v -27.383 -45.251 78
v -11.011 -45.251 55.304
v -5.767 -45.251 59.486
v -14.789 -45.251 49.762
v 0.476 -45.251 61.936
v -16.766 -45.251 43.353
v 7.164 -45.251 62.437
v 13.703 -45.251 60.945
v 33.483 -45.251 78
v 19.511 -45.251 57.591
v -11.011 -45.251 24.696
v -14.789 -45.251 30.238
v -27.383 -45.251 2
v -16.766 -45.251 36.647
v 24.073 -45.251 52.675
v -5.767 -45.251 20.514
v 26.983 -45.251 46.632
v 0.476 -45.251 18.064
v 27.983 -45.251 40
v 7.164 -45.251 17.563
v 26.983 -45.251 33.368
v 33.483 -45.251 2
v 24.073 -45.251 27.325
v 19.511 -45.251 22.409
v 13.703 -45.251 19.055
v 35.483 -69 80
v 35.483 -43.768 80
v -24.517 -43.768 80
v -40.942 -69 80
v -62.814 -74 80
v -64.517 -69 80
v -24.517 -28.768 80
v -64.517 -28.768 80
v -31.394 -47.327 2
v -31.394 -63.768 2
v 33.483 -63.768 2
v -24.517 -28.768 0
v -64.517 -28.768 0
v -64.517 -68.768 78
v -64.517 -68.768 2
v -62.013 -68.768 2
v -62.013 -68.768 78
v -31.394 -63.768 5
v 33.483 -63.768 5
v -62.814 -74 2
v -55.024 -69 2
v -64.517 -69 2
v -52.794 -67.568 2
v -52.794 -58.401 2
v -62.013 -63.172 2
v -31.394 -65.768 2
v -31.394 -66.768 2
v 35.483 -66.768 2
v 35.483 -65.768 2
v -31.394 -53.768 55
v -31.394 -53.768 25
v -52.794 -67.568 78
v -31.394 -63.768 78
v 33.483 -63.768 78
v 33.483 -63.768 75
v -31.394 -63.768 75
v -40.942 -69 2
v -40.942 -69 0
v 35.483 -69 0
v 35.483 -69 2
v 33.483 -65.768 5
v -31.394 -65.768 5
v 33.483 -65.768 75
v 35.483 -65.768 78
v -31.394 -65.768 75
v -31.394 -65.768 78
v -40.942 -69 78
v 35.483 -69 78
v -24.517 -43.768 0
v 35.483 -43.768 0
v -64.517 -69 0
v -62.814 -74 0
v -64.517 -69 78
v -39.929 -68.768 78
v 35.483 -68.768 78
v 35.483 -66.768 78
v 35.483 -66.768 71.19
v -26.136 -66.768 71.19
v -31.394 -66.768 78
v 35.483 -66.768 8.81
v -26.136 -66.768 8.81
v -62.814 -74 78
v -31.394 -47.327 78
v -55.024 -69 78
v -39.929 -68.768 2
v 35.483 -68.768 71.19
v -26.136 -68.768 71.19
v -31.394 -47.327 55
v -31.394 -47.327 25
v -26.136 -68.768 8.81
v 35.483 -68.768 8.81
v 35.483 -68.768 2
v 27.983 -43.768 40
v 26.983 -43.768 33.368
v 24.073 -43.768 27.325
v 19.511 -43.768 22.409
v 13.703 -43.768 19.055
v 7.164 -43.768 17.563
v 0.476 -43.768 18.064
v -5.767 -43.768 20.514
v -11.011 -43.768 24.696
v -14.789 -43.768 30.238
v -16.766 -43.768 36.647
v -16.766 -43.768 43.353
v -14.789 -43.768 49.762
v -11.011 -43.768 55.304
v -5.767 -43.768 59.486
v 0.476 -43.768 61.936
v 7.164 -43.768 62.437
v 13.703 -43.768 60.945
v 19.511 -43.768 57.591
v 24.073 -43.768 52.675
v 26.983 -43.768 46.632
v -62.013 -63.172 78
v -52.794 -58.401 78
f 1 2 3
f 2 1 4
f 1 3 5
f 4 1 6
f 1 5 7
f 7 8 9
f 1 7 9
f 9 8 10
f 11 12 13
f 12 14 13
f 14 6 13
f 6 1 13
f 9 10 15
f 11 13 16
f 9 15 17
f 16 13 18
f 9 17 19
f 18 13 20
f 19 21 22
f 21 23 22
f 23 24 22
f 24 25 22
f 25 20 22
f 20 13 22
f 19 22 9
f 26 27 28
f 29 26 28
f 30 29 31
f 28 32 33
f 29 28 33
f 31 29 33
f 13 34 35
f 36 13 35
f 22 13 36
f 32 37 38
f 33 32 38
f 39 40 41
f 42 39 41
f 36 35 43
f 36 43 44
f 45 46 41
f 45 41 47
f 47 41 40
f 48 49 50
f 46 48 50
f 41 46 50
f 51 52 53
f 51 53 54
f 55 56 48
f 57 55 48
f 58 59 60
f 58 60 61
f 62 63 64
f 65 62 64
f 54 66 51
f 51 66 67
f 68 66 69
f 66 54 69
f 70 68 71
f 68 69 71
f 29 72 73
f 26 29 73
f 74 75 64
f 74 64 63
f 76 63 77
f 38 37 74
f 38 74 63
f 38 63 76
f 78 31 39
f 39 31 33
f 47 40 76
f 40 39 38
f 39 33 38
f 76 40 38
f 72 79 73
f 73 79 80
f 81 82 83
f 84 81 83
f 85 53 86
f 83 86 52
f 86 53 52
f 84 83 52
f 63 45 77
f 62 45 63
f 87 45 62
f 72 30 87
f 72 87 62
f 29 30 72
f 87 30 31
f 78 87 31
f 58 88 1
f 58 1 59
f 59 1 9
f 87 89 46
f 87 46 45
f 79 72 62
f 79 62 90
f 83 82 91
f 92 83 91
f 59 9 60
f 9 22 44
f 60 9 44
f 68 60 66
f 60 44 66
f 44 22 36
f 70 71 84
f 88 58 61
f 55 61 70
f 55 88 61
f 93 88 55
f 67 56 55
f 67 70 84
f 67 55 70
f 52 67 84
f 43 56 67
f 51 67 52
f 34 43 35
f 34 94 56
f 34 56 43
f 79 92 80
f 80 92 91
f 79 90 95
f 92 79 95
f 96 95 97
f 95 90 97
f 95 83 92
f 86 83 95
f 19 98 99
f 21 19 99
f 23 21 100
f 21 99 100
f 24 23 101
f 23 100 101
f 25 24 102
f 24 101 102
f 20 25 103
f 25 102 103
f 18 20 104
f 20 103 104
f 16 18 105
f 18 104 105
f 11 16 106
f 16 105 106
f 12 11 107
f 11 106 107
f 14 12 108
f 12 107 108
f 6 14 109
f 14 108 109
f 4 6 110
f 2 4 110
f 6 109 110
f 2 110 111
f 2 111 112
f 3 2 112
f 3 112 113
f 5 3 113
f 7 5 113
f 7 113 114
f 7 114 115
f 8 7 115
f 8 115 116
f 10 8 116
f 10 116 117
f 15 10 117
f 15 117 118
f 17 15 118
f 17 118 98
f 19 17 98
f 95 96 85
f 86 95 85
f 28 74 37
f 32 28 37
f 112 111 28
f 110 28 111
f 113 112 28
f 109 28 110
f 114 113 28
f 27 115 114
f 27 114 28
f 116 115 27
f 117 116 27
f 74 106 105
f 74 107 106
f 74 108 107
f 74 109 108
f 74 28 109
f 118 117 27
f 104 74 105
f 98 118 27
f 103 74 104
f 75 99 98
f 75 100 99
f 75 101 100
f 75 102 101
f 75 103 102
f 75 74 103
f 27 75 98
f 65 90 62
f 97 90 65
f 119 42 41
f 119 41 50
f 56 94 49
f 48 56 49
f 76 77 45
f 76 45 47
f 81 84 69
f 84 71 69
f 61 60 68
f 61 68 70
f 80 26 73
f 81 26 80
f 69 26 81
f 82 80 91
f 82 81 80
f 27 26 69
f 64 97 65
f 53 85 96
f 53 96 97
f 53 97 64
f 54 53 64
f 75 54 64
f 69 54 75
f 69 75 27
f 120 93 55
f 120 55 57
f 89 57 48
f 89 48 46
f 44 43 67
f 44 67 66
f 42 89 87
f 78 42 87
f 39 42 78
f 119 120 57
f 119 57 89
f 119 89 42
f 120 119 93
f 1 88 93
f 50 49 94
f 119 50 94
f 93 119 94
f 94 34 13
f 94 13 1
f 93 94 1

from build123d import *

# Parameters (mm, degrees)
BOSS_EXTRUDE1_DEPTH      = 80
BOSS_EXTRUDE2_DEPTH      = 25
SKETCH5_W                = 100
SKETCH5_H                = 2
BOSS_EXTRUDE3_DEPTH      = 1
BOSS_EXTRUDE3_DEPTH_BACK = 69
CUT_EXTRUDE1_DEPTH       = 54
CUT_EXTRUDE1_DEPTH_BACK  = 128
BOSS_EXTRUDE4_DEPTH      = 80
BOSS_EXTRUDE5_DEPTH      = 2
BOSS_EXTRUDE6_DEPTH      = 2
CUT_EXTRUDE2_DEPTH       = 10
SKETCH12_W               = 66.626507626
SKETCH12_H               = 2
BOSS_EXTRUDE7_DEPTH      = 3
SKETCH13_W               = 64.876762197
SKETCH13_H               = 2
BOSS_EXTRUDE8_DEPTH      = 3
CUT_EXTRUDE3_DEPTH       = 61.618605692


with BuildPart() as part:
    # Sketch1 → Boss-Extrude1 (new body)
    with BuildSketch(Plane.XY):
        Polygon((33.482657766, -45.251477229), (33.482657766, -66.768484939), (-31.394104431, -66.768484939), (-31.394104431, -53.768484939), (-54.654934222, -68.768484939), (35.482657766, -68.768484939), (35.482657766, -43.768484939), (-24.517342234, -43.768484939), (-24.517342234, -28.768484939), (-64.517342234, -28.768484939), (-64.517342234, -68.768484939), (-62.012951809, -68.768484939), (-62.012951809, -63.171810384), (-27.383124188, -45.251477229), align=None)
    extrude(amount=BOSS_EXTRUDE1_DEPTH)

    # Sketch4 → Boss-Extrude2 (add)
    with BuildSketch(Plane(origin=(0, -43.768484939, 0), x_dir=(1, 0, 0), z_dir=(0, 1, 0))):
        Polygon((-54.654934222, -80), (-31.394104431, -80), (-31.394104431, -55), align=None)
        Polygon((-54.654934222, 0), (-31.394104431, 0), (-31.394104431, -25), align=None)
    extrude(amount=-BOSS_EXTRUDE2_DEPTH)

    # Sketch5 → Boss-Extrude3 (add, two sides)
    with BuildSketch(Plane(origin=(0, 0, 0), x_dir=(1, 0, 0), z_dir=(0, 1, 0))) as boss_extrude3_sk:
        with Locations((-14.517342234, -79)):
            Rectangle(SKETCH5_W, SKETCH5_H)
        with Locations((-14.517342234, -1)):
            Rectangle(SKETCH5_W, SKETCH5_H)
    extrude(amount=BOSS_EXTRUDE3_DEPTH)
    extrude(boss_extrude3_sk.sketch, amount=-BOSS_EXTRUDE3_DEPTH_BACK)

    # Sketch6 → Cut-Extrude1 (cut, two sides)
    with BuildSketch(Plane(origin=(0, 0, 0), x_dir=(-1, 0, 0), z_dir=(0, 0, -1))) as cut_extrude1_sk:
        Polygon((64.517342234, -28.768484939), (24.517342234, -28.768484939), (24.517342234, -43.768484939), (-35.482657766, -43.768484939), (-64.959998335, 15.691238157), (80.820060582, 20.703322698), align=None)
    extrude(amount=CUT_EXTRUDE1_DEPTH, mode=Mode.SUBTRACT)
    extrude(cut_extrude1_sk.sketch, amount=-CUT_EXTRUDE1_DEPTH_BACK, mode=Mode.SUBTRACT)

    # Sketch7 → Boss-Extrude4 (add)
    with BuildSketch(Plane.XY.offset(80)):
        Polygon((-40.942007341, -69), (-55.024396115, -69), (-62.814493255, -74), align=None)
        Polygon((-47.280486214, -68.008659762), (-52.794067838, -67.568484939), (-55.024396115, -69), (-40.942007341, -69), (-39.368534116, -68.640307638), align=None)
    extrude(amount=-BOSS_EXTRUDE4_DEPTH)

    # Sketch9 → Boss-Extrude5 (add)
    with BuildSketch(Plane.XY.offset(80)):
        Polygon((-64.517342234, -69), (-55.024396115, -69), (-62.814493255, -74), align=None)
    extrude(amount=-BOSS_EXTRUDE5_DEPTH)

    # Sketch10 → Boss-Extrude6 (add)
    with BuildSketch(Plane(origin=(0, 0, 0), x_dir=(-1, 0, 0), z_dir=(0, 0, -1))):
        Polygon((64.517342234, -69), (55.024396115, -69), (62.814493255, -74), align=None)
    extrude(amount=-BOSS_EXTRUDE6_DEPTH)

    # Sketch11 → Cut-Extrude2 (cut)
    with BuildSketch(Plane(origin=(0, -43.768484939, 0), x_dir=(1, 0, 0), z_dir=(0, 1, 0))):
        with BuildLine():
            ThreePointArc((-17.017342234, -40), (5.482657766, -62.5), (27.982657766, -40))
            Line((27.982657766, -40), (-17.017342234, -40))
        make_face()
        with BuildLine():
            Line((-17.017342234, -40), (27.982657766, -40))
            ThreePointArc((27.982657766, -40), (5.482657766, -17.5), (-17.017342234, -40))
        make_face()
    extrude(amount=-CUT_EXTRUDE2_DEPTH, mode=Mode.SUBTRACT)

    # Sketch12 → Boss-Extrude7 (add)
    with BuildSketch(Plane(origin=(0, 0, 78), x_dir=(-1, 0, 0), z_dir=(0, 0, -1))):
        with Locations((-1.919149382, -64.768484939)):
            Rectangle(SKETCH12_W, SKETCH12_H)
    extrude(amount=BOSS_EXTRUDE7_DEPTH)

    # Sketch13 → Boss-Extrude8 (add)
    with BuildSketch(Plane.XY.offset(2)):
        with Locations((1.044276668, -64.768484939)):
            Rectangle(SKETCH13_W, SKETCH13_H)
    extrude(amount=BOSS_EXTRUDE8_DEPTH)

    # Sketch14 → Cut-Extrude3 (cut)
    with BuildSketch(Plane(origin=(35.482657766, 0, 0), x_dir=(0, 0, -1), z_dir=(1, 0, 0))):
        Polygon((-2, -65.768484939), (-78, -65.768484939), (-78, -66.768484939), (-71.1896289, -66.768484939), (-71.1896289, -68.768484939), (-40, -68.768484939), (-8.8103711, -68.768484939), (-8.8103711, -66.768484939), (-2, -66.768484939), align=None)
    extrude(amount=-CUT_EXTRUDE3_DEPTH, mode=Mode.SUBTRACT)


solid = part.part
